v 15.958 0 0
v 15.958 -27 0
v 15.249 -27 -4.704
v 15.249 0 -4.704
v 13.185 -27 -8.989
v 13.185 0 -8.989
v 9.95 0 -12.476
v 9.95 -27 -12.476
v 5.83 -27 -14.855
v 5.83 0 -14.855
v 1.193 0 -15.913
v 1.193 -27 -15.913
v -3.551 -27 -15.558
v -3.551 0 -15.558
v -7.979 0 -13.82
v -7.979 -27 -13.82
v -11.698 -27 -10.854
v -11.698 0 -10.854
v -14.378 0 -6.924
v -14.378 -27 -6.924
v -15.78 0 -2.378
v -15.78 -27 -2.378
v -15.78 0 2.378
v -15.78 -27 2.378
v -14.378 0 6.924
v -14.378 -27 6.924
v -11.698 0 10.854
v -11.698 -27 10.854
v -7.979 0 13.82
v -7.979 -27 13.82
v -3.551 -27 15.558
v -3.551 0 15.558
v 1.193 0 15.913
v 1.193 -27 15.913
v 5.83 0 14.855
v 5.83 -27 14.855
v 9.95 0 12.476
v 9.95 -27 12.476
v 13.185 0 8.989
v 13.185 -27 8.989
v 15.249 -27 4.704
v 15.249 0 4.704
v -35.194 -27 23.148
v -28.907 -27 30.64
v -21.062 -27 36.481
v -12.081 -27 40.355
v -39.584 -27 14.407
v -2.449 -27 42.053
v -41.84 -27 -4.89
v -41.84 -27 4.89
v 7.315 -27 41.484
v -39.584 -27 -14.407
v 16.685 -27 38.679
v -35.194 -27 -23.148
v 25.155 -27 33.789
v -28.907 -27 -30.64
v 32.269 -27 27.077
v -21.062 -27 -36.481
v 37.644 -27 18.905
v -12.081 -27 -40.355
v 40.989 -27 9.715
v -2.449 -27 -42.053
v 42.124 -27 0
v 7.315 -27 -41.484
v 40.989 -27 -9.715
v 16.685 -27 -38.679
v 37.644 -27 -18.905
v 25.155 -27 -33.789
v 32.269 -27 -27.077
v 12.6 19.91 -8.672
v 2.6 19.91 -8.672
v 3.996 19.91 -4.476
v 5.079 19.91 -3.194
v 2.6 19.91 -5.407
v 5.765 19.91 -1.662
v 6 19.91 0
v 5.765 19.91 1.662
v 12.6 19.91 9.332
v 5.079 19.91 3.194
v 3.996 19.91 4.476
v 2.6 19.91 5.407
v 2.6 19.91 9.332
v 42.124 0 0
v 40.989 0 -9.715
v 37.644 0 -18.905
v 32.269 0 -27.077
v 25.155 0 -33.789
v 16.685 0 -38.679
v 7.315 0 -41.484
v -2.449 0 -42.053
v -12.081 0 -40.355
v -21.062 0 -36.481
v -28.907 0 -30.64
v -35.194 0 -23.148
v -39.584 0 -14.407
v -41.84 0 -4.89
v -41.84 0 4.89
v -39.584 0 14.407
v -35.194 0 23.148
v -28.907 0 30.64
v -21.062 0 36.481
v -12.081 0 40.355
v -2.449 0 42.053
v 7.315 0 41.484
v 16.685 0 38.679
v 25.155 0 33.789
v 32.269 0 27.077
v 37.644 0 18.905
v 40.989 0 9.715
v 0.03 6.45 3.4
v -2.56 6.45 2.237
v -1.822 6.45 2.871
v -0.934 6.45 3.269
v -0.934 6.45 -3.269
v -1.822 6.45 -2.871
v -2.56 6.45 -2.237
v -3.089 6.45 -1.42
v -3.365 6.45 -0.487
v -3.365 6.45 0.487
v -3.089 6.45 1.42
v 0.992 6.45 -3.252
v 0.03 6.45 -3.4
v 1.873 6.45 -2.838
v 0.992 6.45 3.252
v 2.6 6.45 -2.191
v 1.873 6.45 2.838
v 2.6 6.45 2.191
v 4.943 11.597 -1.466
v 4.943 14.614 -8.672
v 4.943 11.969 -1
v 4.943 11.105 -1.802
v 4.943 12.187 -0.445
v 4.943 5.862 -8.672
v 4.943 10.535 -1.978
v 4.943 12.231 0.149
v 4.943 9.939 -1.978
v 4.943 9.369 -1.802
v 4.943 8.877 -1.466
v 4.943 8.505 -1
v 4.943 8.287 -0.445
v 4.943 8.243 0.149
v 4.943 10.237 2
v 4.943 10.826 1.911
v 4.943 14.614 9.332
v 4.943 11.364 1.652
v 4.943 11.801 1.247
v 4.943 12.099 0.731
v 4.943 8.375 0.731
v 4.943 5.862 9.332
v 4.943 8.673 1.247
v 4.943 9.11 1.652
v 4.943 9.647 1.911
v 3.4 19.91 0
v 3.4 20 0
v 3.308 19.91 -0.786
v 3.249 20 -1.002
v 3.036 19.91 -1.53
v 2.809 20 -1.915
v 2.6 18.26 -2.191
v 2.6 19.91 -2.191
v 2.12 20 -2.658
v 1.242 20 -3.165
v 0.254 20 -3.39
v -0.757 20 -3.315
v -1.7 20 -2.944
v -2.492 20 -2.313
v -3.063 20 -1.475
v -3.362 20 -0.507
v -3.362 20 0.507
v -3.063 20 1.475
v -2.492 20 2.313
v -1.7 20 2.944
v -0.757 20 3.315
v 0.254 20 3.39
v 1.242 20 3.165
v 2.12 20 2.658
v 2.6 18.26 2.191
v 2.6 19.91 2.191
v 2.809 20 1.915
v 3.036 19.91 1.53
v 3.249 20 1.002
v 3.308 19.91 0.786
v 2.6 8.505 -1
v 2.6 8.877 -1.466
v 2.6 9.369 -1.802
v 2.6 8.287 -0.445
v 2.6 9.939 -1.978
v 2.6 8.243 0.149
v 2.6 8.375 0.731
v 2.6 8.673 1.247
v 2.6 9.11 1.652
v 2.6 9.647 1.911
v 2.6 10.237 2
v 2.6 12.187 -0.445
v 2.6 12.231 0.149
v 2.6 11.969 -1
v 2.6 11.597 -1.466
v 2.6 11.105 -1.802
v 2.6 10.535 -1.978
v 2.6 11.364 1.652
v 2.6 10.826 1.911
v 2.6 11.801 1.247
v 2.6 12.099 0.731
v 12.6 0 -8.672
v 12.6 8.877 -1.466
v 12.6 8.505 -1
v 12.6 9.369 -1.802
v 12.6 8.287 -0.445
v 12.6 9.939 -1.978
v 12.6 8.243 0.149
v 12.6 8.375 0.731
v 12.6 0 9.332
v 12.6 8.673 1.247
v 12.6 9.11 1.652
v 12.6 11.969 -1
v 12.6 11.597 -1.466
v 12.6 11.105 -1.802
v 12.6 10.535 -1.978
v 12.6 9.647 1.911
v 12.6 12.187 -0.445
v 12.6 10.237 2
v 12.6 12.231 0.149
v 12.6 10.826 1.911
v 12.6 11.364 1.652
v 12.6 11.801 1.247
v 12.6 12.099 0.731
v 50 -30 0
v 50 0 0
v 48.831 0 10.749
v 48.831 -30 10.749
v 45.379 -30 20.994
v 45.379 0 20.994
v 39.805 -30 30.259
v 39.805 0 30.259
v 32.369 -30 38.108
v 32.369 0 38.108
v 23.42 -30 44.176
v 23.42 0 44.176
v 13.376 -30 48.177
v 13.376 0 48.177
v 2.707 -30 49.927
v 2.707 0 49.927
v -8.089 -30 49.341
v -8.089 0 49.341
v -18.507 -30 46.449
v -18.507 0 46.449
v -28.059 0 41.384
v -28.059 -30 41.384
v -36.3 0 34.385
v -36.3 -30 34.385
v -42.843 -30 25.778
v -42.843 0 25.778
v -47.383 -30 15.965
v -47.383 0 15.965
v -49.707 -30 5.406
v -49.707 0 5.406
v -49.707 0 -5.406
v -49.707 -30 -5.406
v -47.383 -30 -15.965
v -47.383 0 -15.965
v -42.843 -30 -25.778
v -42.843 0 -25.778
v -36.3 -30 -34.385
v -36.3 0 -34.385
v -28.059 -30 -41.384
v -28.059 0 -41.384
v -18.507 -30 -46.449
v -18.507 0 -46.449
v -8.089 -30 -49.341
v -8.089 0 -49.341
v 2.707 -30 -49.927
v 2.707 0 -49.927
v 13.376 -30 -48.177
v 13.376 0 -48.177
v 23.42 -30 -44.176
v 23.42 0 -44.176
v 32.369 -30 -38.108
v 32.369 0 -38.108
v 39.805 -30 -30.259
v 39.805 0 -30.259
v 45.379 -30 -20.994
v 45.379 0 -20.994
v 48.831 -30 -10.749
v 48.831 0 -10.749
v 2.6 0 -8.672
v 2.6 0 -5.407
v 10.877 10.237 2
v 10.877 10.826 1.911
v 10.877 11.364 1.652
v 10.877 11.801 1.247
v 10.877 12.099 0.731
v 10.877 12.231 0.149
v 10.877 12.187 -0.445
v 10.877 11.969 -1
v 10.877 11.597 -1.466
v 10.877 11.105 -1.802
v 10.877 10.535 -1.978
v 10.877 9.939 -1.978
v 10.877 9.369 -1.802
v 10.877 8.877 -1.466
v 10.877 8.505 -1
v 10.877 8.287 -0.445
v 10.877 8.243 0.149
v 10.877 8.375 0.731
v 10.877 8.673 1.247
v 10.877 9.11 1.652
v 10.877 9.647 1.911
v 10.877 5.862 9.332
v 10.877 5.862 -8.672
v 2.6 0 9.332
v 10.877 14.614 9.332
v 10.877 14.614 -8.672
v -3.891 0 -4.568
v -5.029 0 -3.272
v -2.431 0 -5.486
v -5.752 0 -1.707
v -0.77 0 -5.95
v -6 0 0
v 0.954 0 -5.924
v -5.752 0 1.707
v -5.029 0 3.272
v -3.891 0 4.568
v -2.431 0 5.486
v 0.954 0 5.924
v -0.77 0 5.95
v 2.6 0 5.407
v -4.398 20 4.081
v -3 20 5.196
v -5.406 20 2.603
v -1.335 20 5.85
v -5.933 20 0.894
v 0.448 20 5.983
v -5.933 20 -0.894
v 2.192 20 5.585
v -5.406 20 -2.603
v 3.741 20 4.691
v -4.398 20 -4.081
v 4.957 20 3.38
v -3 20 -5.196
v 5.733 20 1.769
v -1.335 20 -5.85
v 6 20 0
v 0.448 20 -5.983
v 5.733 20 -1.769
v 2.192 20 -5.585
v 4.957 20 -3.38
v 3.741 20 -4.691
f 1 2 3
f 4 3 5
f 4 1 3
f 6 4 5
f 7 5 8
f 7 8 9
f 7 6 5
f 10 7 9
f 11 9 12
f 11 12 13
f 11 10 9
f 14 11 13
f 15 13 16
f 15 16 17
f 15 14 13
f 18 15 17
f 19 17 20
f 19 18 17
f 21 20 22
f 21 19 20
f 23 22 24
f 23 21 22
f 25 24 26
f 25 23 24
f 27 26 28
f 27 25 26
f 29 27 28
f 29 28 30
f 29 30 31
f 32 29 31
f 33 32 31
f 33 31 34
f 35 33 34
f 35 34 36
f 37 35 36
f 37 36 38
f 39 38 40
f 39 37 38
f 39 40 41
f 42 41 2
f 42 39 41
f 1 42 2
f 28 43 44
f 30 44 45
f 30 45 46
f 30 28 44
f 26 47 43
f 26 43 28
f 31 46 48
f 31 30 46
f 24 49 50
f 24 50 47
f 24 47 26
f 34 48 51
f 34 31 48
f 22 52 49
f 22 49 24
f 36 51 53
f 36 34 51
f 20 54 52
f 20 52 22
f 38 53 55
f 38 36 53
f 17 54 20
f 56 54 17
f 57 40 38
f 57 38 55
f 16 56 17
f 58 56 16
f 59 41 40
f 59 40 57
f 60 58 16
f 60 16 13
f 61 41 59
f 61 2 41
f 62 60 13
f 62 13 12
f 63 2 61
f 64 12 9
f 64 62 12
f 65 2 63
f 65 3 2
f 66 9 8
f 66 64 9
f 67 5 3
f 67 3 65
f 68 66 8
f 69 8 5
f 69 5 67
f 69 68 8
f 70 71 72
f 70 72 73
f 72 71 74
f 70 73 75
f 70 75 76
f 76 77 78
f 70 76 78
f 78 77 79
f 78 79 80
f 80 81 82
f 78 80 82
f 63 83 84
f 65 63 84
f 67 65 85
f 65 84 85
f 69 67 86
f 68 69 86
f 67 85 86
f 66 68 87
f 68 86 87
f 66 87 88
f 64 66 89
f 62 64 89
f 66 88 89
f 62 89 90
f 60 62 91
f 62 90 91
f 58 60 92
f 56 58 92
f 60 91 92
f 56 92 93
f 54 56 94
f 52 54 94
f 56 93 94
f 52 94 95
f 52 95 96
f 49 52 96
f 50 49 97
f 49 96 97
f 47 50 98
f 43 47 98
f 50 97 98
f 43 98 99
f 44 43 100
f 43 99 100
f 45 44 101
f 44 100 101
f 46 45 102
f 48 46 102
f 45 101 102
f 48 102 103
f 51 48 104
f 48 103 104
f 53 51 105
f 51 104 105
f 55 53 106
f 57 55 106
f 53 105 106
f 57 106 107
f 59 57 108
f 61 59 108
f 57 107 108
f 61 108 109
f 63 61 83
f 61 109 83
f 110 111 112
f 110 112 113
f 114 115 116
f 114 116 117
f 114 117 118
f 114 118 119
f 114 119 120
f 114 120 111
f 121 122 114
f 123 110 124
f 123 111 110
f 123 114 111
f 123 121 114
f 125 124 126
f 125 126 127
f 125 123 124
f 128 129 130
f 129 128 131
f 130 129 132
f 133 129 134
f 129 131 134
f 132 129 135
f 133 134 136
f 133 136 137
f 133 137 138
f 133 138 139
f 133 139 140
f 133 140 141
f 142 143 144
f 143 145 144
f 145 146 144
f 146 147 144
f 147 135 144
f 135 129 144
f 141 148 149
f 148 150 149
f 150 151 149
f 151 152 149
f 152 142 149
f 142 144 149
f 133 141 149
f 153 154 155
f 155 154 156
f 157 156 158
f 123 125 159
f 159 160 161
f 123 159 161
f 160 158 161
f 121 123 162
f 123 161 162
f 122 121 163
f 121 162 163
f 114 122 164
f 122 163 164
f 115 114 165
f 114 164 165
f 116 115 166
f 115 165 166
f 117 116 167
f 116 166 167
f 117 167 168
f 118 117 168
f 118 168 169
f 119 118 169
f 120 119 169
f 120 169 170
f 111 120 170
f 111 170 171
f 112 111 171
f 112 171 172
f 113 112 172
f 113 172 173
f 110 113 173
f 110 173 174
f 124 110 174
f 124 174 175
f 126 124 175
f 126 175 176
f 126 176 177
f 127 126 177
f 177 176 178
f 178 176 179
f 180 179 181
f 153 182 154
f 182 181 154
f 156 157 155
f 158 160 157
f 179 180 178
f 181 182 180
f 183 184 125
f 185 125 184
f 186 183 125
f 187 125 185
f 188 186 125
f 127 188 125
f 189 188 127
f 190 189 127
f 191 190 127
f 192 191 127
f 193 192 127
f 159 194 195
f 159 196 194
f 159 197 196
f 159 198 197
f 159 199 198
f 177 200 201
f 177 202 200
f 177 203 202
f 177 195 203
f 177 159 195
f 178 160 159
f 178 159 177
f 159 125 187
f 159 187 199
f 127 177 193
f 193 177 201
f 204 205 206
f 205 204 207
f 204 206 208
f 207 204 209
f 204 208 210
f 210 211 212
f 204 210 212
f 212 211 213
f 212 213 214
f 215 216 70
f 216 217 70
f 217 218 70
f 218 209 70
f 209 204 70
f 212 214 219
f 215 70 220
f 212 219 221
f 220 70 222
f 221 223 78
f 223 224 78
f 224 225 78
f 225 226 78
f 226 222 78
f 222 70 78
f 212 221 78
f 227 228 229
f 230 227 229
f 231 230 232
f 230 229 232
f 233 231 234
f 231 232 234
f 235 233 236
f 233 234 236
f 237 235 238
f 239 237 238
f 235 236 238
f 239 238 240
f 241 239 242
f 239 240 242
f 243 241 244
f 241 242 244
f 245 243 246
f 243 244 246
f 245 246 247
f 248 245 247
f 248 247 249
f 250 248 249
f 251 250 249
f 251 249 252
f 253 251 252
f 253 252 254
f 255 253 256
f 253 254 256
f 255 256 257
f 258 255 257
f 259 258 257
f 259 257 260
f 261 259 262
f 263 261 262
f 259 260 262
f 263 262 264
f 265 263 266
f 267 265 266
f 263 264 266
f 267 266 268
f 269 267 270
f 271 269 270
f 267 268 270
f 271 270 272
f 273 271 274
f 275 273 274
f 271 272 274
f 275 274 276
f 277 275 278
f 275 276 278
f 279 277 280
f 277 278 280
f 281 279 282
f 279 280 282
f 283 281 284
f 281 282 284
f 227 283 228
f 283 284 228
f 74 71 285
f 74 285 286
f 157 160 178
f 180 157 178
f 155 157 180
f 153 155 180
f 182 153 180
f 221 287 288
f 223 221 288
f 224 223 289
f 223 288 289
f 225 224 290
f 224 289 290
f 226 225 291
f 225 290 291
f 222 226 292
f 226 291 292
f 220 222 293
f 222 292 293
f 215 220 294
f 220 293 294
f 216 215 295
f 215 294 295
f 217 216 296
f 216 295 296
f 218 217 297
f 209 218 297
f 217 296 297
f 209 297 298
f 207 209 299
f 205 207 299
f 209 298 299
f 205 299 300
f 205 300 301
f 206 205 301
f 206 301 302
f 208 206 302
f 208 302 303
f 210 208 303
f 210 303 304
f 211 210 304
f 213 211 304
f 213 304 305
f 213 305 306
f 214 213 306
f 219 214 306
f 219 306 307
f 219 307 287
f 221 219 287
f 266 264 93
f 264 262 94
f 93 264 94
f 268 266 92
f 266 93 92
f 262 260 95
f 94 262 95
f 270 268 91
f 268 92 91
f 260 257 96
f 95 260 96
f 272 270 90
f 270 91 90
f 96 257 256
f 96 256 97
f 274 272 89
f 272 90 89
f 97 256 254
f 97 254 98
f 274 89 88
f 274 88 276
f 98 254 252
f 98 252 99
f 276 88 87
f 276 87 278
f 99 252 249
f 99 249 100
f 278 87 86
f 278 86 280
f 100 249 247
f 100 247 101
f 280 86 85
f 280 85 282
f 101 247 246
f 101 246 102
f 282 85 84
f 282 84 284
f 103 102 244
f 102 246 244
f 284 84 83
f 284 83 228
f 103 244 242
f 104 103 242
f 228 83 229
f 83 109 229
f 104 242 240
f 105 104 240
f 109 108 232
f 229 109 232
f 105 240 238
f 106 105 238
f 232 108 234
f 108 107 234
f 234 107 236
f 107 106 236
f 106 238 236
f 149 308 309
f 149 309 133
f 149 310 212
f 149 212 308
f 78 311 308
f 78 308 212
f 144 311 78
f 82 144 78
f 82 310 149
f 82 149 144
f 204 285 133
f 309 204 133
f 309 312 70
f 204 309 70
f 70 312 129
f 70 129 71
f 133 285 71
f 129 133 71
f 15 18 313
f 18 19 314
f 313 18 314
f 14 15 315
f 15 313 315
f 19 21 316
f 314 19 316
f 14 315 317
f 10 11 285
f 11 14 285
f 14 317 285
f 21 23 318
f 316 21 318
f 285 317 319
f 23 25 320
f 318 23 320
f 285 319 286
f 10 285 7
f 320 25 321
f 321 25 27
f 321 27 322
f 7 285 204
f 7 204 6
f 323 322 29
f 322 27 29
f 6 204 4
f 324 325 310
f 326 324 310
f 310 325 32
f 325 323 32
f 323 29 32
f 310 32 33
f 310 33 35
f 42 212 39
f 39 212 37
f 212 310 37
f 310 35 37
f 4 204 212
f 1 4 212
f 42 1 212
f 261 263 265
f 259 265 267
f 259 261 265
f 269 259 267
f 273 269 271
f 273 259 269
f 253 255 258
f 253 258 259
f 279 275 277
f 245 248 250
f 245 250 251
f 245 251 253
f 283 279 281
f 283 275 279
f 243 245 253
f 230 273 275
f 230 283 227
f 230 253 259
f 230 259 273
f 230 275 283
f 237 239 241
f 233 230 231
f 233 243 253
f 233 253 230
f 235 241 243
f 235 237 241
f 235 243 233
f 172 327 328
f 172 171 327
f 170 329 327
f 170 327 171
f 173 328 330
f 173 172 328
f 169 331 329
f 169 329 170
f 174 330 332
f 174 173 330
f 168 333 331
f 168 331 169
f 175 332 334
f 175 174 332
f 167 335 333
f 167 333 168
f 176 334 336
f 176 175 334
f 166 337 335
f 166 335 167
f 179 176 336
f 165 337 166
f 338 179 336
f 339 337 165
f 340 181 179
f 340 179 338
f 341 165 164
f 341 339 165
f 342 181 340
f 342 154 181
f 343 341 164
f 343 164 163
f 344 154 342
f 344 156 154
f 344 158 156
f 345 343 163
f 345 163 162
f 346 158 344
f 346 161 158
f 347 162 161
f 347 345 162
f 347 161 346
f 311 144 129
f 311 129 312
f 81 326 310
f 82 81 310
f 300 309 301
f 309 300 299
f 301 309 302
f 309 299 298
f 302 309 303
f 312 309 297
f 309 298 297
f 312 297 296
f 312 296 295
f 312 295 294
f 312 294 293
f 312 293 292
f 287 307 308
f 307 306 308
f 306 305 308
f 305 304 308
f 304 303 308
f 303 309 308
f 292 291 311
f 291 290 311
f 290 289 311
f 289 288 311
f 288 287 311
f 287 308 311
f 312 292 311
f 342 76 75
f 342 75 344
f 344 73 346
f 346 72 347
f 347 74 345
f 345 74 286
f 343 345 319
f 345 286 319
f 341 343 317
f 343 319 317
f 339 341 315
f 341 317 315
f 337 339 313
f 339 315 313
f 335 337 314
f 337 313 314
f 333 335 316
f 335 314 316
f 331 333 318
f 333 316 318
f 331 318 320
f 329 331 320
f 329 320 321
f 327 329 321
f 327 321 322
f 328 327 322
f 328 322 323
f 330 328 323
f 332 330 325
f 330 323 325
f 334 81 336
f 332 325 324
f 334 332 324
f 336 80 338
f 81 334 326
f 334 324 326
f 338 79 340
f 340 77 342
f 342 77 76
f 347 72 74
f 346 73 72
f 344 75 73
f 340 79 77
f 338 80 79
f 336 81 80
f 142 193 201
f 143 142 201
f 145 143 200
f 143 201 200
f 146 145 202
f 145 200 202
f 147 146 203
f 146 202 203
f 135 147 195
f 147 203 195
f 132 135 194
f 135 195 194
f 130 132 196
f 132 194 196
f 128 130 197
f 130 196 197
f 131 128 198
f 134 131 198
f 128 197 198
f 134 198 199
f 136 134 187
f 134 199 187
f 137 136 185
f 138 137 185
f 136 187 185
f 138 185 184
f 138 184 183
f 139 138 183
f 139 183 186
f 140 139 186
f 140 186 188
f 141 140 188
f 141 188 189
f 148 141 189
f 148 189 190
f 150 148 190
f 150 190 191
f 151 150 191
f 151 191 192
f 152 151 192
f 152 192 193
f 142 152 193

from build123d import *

# Parameters (mm, degrees)
SKETCH1_R               = 6
BOSS_EXTRUDE1_DEPTH     = 20
SKETCH2_R               = 3.4
CUT_EXTRUDE1_DEPTH      = 13.55
SKETCH5_W               = 1.550685087
SKETCH5_H               = 7.184215806
BOSS_EXTRUDE2_DEPTH     = 13.55
SKETCH7_W               = 18.003976239
SKETCH7_H               = 19.909960041
BOSS_EXTRUDE3_DEPTH     = 10
CUT_EXTRUDE2_DEPTH      = 1
CUT_EXTRUDE2_DEPTH_BACK = 13.55
SKETCH6_R               = 2
CUT_EXTRUDE3_DEPTH      = 10
CUT_EXTRUDE3_DEPTH_BACK = 10
SKETCH10_R              = 50
BOSS_EXTRUDE4_DEPTH     = 30
SKETCH12_R              = 42.124366513
SKETCH12_R_2            = 15.95790089
CUT_EXTRUDE5_DEPTH      = 27


with BuildPart() as part:
    # Sketch1 → Boss-Extrude1 (new body)
    with BuildSketch(Plane(origin=(0, 0, 0), x_dir=(1, 0, 0), z_dir=(0, 1, 0))):
        Circle(SKETCH1_R)
    extrude(amount=BOSS_EXTRUDE1_DEPTH)

    # Sketch2 → Cut-Extrude1 (cut)
    with BuildSketch(Plane(origin=(0, 20, 0), x_dir=(1, 0, 0), z_dir=(0, 1, 0))):
        Circle(SKETCH2_R)
    extrude(amount=-CUT_EXTRUDE1_DEPTH, mode=Mode.SUBTRACT)

    # Sketch5 → Boss-Extrude2 (add)
    with BuildSketch(Plane(origin=(0, 18.26, 0), x_dir=(1, 0, 0), z_dir=(0, 1, 0))):
        with Locations((3.375342544, 0.020519704)):
            Rectangle(SKETCH5_W, SKETCH5_H)
    extrude(amount=-BOSS_EXTRUDE2_DEPTH)

    # Sketch7 → Boss-Extrude3 (add)
    with BuildSketch(Plane.ZY.offset(-2.6)):
        with Locations((0.33027221, 9.954980021)):
            Rectangle(SKETCH7_W, SKETCH7_H)
    extrude(amount=-BOSS_EXTRUDE3_DEPTH)

    # Sketch6 → Cut-Extrude2 (cut, two sides: drawn at the far end of the back side and taken through both)
    with BuildSketch(Plane.ZY.offset(-2.6).offset(-CUT_EXTRUDE2_DEPTH_BACK)):
        with Locations((0, 10.236925537)):
            Circle(SKETCH6_R)
    extrude(amount=CUT_EXTRUDE2_DEPTH + CUT_EXTRUDE2_DEPTH_BACK, mode=Mode.SUBTRACT)

    # Sketch9 → Cut-Extrude3 (cut, two sides: drawn at the far end of the back side and taken through both)
    with BuildSketch(Plane.XY.offset(-CUT_EXTRUDE3_DEPTH_BACK)):
        Polygon((10.876516382, 10.236925537), (10.876516382, 5.861925537), (4.943430227, 5.861925537), (4.943430227, 10.236925537), (4.943430227, 14.614332445), (10.876516382, 14.614332445), align=None)
    extrude(amount=CUT_EXTRUDE3_DEPTH + CUT_EXTRUDE3_DEPTH_BACK, mode=Mode.SUBTRACT)

    # Sketch10 → Boss-Extrude4 (add)
    with BuildSketch(Plane.XZ):
        Circle(SKETCH10_R)
    extrude(amount=BOSS_EXTRUDE4_DEPTH)

    # Sketch12 → Cut-Extrude5 (cut)
    with BuildSketch(Plane(origin=(0, 0, 0), x_dir=(1, 0, 0), z_dir=(0, 1, 0))):
        Circle(SKETCH12_R)
        Circle(SKETCH12_R_2, mode=Mode.SUBTRACT)
    extrude(amount=-CUT_EXTRUDE5_DEPTH, mode=Mode.SUBTRACT)


solid = part.part
